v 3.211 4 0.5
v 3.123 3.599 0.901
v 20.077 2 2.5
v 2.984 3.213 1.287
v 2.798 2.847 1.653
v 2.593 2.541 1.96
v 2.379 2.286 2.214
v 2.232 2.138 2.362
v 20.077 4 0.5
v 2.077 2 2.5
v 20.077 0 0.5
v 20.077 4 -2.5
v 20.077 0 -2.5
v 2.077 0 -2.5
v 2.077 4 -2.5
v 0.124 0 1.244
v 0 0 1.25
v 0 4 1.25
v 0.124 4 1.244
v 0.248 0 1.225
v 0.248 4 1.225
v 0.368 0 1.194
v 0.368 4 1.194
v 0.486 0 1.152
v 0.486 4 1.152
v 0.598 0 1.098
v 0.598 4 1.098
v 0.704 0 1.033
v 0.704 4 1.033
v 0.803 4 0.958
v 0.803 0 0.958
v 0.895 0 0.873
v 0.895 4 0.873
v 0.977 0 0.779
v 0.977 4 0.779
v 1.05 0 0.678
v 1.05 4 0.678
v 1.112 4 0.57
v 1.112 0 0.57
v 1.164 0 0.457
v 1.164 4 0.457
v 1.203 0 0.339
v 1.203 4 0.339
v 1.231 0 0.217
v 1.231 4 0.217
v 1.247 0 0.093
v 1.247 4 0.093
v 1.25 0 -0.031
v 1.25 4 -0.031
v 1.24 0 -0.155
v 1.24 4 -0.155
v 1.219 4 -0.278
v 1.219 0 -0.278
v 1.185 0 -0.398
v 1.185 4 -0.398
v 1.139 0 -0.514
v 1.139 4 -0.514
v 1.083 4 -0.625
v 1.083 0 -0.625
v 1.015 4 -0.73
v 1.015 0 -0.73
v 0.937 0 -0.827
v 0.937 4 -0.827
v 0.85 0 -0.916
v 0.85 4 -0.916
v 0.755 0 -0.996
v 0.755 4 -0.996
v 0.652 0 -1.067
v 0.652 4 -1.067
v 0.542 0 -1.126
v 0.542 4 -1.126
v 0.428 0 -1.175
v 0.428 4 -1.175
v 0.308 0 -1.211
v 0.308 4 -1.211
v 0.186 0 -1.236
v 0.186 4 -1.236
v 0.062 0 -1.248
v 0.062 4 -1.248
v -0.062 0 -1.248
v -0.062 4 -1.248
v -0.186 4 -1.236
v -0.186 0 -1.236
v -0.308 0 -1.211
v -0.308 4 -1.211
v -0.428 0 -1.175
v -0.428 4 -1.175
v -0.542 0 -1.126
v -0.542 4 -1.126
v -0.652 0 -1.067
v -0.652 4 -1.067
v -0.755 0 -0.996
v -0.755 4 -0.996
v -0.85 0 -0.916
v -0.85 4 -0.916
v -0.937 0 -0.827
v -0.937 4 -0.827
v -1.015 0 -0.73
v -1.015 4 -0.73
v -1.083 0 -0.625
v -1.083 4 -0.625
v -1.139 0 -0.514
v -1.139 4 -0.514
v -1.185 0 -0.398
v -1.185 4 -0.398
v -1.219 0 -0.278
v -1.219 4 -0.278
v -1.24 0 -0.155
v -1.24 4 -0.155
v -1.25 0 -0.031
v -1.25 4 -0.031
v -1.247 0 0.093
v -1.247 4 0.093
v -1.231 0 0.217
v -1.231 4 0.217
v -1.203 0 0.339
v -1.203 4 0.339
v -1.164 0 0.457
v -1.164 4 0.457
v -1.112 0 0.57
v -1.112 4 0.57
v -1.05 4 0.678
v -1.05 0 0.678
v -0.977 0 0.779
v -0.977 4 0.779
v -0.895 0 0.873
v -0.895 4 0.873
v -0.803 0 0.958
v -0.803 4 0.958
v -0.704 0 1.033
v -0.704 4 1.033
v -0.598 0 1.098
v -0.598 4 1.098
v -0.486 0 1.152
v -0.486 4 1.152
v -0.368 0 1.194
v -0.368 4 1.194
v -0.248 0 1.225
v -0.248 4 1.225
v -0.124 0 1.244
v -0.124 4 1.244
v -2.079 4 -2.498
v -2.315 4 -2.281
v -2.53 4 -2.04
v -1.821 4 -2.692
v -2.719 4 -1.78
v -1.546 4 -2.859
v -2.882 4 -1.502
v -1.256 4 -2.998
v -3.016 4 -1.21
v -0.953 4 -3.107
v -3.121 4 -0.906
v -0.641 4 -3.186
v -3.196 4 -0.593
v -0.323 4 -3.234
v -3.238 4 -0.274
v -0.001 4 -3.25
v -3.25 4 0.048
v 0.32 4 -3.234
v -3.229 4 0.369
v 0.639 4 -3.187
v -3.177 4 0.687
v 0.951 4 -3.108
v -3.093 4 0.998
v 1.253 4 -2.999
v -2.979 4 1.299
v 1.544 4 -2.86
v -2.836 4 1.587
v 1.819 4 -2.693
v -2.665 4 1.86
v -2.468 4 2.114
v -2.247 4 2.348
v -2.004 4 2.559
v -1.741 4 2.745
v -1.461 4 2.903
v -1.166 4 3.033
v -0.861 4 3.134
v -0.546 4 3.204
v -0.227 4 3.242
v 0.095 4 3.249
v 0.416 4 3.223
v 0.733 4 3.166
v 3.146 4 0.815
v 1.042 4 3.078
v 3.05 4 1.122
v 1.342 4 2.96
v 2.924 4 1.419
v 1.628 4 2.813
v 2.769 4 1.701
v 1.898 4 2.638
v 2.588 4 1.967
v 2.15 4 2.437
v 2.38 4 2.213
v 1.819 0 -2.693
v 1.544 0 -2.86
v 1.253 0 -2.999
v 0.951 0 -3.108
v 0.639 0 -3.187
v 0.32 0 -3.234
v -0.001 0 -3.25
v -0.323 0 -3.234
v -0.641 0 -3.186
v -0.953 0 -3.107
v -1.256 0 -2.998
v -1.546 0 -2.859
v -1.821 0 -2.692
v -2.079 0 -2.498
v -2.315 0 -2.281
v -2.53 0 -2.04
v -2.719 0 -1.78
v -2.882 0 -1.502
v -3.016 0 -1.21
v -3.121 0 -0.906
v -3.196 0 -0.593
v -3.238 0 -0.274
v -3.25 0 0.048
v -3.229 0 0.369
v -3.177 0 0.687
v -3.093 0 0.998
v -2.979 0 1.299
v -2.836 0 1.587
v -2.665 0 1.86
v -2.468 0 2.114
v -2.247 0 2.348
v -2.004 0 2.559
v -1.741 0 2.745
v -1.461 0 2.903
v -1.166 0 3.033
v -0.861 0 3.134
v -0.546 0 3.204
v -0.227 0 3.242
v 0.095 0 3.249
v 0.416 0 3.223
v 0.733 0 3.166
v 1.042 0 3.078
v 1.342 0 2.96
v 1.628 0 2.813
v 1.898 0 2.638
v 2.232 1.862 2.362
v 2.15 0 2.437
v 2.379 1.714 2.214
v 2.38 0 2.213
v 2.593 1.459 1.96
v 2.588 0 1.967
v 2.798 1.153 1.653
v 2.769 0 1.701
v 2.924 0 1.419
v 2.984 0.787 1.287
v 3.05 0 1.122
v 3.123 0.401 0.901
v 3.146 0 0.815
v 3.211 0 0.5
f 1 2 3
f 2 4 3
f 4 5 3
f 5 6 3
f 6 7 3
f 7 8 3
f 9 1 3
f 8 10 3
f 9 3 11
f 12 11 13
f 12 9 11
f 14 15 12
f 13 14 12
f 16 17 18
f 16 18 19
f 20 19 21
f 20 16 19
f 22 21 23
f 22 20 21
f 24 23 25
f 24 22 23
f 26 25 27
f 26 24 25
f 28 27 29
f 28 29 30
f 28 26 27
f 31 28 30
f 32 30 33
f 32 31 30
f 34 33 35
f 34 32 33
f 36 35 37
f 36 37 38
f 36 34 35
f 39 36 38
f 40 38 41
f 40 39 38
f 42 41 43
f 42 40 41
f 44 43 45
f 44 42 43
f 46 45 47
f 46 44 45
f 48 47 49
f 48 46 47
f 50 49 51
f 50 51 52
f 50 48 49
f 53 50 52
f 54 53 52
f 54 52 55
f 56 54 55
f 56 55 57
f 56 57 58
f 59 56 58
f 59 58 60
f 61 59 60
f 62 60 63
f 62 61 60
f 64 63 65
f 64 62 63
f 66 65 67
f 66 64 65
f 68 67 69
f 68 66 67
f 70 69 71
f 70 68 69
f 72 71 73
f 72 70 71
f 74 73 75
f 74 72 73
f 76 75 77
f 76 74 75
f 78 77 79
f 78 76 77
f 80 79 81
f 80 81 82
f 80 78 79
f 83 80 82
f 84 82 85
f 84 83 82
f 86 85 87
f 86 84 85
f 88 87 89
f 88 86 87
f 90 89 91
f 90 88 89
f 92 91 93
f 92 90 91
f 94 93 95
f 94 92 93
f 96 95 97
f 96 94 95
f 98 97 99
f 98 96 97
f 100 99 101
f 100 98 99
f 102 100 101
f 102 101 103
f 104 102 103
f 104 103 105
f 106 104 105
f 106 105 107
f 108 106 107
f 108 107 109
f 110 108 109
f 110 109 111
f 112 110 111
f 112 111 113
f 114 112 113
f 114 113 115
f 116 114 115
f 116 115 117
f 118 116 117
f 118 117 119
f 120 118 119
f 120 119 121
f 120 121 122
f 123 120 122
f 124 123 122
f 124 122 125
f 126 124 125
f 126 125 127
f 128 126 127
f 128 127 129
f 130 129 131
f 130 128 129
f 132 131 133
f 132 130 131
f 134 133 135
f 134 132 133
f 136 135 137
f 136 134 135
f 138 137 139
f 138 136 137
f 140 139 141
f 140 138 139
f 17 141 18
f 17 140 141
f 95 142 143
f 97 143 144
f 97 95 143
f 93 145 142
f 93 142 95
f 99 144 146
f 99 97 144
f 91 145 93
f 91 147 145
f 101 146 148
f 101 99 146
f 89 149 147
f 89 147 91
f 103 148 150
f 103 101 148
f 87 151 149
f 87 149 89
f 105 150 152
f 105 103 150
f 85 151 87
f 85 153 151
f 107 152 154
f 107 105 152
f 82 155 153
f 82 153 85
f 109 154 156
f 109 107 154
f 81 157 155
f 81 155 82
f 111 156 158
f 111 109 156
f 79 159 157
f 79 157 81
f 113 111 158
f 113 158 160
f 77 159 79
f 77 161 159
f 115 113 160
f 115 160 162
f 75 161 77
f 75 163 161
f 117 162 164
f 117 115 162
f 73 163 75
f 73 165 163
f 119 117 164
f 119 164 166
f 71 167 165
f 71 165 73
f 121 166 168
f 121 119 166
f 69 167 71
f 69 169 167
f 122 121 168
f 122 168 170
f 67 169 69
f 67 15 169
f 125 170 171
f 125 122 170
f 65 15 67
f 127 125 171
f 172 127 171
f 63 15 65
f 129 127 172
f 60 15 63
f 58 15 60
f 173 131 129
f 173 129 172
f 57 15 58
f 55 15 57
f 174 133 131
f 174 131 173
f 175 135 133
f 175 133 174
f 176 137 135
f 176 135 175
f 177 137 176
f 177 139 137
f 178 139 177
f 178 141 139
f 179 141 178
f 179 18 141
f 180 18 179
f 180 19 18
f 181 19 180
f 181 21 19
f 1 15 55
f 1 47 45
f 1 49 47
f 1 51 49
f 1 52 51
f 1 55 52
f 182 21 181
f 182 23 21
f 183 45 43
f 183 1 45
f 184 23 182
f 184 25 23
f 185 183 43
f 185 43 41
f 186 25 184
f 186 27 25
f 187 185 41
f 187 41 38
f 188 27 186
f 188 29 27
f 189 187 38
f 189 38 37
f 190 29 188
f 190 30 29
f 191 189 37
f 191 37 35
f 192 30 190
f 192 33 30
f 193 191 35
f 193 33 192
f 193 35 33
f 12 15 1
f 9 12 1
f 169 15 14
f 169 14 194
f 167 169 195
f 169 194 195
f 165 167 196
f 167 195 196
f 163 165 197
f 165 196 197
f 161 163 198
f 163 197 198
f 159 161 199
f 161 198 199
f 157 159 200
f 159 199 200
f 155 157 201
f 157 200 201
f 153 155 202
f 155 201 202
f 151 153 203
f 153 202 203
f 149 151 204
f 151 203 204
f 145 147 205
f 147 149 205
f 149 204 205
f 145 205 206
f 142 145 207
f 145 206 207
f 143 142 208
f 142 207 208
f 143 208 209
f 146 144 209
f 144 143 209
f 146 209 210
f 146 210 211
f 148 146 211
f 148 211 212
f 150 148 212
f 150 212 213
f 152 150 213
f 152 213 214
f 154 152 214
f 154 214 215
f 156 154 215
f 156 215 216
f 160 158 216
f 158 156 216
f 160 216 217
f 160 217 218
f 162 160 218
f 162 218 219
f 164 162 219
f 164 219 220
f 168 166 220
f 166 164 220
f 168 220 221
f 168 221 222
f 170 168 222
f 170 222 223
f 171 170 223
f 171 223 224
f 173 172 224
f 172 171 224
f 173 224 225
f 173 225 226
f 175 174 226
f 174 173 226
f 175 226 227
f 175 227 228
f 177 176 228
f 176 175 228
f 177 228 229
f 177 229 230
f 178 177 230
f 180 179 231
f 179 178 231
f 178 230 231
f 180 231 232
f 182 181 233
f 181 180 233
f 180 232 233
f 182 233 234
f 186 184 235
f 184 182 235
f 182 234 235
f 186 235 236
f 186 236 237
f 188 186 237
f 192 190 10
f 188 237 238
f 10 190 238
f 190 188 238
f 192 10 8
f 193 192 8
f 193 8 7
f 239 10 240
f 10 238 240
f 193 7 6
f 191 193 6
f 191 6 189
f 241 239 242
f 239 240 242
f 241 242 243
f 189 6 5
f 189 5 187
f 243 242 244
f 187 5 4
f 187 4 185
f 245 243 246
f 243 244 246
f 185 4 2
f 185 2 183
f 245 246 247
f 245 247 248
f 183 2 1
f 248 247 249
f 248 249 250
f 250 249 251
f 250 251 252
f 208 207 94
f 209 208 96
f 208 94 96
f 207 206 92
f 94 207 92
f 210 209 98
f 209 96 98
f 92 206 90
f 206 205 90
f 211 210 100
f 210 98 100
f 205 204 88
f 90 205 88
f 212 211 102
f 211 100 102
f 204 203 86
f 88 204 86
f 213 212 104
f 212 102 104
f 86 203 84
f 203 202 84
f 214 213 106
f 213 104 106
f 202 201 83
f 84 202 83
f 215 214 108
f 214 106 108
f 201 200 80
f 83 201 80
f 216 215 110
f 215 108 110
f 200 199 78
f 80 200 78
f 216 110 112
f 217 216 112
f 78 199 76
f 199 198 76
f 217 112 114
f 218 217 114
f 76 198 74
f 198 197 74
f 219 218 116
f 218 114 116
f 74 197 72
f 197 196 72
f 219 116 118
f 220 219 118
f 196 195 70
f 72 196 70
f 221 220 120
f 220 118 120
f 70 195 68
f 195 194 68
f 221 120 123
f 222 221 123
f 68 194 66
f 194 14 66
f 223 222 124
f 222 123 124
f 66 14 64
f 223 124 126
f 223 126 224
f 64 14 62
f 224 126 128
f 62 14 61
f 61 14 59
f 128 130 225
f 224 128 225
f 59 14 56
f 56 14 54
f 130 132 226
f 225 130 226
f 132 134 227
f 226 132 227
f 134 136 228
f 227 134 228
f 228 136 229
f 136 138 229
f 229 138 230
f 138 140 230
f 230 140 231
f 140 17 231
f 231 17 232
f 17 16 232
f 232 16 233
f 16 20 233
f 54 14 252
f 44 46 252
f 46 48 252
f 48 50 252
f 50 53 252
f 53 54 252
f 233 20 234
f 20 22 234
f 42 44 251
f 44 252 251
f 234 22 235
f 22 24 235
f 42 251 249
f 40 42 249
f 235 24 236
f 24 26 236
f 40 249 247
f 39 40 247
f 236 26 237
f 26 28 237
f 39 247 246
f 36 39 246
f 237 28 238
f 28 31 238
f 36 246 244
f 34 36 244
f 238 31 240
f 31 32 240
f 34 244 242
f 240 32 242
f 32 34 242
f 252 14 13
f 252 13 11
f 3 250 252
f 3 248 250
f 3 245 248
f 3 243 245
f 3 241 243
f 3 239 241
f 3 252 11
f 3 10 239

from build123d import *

# Parameters (mm, degrees)
CROQUIS1_R              = 3.25
CROQUIS1_R_2            = 1.25
SALIENTE_EXTRUIR1_DEPTH = 4
CROQUIS2_W              = 18
CROQUIS2_H              = 5
SALIENTE_EXTRUIR2_DEPTH = 4
CHAFL_N1_SIZE           = 2


with BuildPart() as part:
    # Croquis1 → Saliente-Extruir1 (new body)
    with BuildSketch(Plane(origin=(0, 0, 0), x_dir=(1, 0, 0), z_dir=(0, 1, 0))):
        with Locations(Location((0, 0, 0), (0, 0, 270))):
            Circle(CROQUIS1_R)
        with Locations(Location((0, 0, 0), (0, 0, 270))):
            Circle(CROQUIS1_R_2, mode=Mode.SUBTRACT)
    extrude(amount=SALIENTE_EXTRUIR1_DEPTH)

    # Croquis2 → Saliente-Extruir2 (add)
    with BuildSketch(Plane(origin=(0, 4, 0), x_dir=(1, 0, 0), z_dir=(0, 1, 0))):
        with Locations((11.076655966, 0)):
            Rectangle(CROQUIS2_W, CROQUIS2_H)
    extrude(amount=-SALIENTE_EXTRUIR2_DEPTH)

    # Chaflán1
    chafl_n1_edges = [part.edges().sort_by_distance(p)[0] for p in [
        (11.076655966, 4, 2.5),
        (11.076655966, 0, 2.5),
    ]]
    chamfer(chafl_n1_edges, length=CHAFL_N1_SIZE - 0.0001)  # a hair under: the kernel refuses the full size


solid = part.part
